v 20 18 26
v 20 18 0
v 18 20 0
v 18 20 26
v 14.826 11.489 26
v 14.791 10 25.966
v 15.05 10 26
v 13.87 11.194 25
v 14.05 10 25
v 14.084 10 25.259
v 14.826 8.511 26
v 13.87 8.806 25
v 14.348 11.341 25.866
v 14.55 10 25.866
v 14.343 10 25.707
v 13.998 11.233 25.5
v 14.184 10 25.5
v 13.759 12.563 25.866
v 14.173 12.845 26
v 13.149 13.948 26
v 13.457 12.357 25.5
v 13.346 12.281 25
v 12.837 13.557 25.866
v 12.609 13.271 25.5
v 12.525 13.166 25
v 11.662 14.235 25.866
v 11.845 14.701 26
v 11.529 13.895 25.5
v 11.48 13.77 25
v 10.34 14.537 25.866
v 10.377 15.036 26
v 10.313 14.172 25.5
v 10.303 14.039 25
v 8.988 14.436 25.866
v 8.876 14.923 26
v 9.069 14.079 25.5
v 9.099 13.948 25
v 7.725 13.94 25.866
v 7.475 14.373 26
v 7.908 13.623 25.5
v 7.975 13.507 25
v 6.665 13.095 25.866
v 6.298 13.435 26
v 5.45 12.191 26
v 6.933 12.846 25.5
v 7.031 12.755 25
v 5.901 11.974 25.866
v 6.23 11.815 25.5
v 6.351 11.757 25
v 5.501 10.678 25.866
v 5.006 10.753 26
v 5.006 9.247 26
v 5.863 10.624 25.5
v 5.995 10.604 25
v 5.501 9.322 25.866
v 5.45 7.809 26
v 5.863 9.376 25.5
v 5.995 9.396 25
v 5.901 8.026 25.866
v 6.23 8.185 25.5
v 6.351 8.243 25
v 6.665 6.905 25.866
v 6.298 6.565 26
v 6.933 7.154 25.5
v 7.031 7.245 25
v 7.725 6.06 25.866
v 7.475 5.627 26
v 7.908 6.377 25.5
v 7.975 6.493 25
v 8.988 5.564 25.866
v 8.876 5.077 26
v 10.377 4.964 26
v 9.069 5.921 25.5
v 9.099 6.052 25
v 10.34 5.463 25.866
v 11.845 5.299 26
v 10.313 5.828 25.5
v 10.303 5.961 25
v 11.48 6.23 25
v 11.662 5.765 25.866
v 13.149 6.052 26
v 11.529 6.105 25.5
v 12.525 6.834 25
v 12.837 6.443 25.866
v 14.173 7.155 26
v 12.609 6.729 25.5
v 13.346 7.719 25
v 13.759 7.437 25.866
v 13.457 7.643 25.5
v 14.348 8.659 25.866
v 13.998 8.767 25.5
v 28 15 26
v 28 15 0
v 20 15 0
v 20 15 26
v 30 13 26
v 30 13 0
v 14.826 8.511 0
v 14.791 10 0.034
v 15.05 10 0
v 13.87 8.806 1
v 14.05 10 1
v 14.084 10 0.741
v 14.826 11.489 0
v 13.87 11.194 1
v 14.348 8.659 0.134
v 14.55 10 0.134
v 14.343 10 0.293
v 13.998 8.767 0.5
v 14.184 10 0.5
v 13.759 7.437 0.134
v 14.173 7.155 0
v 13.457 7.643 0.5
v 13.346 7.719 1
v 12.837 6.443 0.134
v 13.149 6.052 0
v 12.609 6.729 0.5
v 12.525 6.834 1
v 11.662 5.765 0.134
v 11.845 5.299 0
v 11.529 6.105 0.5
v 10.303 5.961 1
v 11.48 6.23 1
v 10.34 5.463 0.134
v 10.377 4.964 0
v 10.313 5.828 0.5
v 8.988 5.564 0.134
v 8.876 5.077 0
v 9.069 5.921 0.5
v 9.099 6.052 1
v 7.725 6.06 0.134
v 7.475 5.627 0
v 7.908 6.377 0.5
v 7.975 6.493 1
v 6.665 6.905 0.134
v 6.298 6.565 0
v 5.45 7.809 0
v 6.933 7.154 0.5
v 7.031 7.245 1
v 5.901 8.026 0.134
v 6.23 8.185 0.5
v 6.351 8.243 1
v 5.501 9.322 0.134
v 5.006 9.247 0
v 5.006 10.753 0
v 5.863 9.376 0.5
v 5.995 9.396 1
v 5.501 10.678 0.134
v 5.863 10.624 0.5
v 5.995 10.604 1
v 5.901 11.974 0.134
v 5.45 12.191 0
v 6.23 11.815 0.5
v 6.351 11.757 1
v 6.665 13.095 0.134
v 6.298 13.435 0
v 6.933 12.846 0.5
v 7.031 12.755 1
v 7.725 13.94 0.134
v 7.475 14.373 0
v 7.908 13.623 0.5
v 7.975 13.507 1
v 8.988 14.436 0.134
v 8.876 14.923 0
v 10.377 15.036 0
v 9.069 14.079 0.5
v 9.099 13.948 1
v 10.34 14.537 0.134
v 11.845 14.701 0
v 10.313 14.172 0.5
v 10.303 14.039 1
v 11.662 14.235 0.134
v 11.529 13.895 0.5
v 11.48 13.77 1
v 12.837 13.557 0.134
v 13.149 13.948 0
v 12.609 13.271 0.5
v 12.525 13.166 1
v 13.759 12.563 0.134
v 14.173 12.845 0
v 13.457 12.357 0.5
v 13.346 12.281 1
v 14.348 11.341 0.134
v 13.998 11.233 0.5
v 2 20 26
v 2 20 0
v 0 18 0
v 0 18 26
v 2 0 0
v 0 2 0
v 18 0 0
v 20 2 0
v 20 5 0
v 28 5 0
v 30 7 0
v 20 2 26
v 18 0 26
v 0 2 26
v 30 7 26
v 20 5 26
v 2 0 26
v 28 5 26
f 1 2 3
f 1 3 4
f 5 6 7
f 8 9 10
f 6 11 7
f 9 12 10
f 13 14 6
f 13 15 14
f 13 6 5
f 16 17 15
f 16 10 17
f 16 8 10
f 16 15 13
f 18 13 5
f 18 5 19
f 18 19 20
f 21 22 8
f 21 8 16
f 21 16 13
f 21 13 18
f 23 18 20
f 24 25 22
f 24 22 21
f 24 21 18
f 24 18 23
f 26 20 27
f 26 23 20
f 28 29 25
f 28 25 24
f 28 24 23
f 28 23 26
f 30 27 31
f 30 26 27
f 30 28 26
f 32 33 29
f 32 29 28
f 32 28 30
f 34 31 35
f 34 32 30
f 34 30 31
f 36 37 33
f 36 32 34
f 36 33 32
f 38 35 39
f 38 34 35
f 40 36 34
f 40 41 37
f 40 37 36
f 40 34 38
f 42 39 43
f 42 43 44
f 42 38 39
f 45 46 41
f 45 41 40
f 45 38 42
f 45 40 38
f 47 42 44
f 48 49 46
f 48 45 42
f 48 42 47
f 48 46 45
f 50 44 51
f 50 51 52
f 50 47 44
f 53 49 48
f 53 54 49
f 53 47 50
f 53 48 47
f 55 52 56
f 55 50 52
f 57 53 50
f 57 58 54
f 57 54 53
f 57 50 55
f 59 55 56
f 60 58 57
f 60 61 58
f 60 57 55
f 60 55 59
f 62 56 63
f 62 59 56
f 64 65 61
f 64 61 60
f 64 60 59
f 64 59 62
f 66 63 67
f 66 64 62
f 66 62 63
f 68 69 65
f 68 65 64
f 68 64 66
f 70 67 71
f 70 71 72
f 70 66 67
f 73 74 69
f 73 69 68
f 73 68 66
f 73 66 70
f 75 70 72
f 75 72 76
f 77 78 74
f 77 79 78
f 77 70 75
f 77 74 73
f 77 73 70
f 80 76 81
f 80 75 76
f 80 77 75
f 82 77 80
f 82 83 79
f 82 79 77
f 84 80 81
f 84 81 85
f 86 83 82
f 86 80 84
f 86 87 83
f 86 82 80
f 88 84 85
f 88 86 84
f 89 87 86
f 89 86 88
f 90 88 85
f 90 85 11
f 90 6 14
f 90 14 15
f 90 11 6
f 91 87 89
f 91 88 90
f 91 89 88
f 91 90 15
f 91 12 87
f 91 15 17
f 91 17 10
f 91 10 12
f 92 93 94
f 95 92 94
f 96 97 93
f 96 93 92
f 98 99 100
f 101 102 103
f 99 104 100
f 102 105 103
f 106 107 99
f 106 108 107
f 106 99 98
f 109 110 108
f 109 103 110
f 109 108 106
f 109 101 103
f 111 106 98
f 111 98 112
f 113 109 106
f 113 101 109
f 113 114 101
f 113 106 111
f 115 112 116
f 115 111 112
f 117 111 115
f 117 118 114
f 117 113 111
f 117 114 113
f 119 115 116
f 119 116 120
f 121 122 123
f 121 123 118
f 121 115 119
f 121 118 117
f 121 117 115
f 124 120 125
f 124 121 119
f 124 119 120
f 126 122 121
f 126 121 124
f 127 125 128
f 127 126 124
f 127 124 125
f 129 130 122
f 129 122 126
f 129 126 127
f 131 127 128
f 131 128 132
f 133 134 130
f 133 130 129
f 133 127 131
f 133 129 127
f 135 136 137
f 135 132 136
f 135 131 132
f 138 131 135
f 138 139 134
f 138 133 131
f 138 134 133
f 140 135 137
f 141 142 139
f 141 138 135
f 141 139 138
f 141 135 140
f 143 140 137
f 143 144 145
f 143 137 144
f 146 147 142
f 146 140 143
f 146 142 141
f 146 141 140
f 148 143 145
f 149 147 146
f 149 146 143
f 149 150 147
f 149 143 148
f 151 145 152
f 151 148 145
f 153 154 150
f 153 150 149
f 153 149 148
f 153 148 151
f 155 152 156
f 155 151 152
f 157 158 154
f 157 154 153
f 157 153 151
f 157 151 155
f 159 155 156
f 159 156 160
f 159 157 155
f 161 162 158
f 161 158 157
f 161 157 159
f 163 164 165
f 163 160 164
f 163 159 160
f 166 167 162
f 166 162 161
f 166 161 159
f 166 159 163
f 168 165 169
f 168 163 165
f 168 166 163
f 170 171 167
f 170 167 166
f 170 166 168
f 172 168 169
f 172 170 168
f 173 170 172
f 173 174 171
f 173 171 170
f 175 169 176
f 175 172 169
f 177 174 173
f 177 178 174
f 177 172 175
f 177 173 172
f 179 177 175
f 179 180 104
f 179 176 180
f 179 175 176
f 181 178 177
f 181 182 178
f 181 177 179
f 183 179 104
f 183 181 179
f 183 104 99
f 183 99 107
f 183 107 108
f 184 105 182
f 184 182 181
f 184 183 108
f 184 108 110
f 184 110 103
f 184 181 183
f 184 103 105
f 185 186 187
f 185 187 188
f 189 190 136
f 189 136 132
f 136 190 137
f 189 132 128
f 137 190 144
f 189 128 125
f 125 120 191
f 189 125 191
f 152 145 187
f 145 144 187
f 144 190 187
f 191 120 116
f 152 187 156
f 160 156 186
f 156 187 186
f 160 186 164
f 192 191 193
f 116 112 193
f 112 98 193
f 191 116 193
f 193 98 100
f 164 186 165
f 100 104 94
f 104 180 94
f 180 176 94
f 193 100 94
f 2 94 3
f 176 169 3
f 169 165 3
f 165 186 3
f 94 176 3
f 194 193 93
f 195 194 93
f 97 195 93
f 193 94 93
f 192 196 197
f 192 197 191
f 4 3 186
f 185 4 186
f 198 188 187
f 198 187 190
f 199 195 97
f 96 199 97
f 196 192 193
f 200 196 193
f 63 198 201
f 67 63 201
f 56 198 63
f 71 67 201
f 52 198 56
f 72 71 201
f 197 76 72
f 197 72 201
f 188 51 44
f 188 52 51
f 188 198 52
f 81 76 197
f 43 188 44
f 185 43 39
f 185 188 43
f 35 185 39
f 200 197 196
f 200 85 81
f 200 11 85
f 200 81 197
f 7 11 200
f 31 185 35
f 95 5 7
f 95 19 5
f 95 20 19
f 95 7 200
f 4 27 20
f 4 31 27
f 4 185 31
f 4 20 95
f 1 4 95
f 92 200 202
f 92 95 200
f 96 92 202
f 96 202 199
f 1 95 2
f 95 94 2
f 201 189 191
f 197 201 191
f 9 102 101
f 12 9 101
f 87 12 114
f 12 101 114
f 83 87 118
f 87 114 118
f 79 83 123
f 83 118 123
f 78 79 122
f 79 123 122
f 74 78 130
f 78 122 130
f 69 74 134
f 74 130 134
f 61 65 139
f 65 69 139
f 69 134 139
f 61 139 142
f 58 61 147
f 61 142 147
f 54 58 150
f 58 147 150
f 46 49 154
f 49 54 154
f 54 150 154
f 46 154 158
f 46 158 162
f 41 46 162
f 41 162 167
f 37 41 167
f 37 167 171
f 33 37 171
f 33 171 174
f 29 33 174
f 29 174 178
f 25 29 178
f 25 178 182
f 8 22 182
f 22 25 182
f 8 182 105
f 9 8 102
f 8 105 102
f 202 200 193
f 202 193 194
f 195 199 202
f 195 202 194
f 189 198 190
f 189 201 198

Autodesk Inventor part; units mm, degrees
ref_plane "YZ Plane" through (0, 0, 0) normal (1, 0, 0) x (0, 1, 0)
ref_plane "XZ Plane" through (0, 0, 0) normal (0, 1, 0) x (-1, 0, 0)
ref_plane "XY Plane" through (0, 0, 0) normal (0, 0, 1) x (1, 0, 0)
sketch "Sketch1" plane through (0, 0, 0) normal (0, 0, 1) x (1, 0, 0)
  line L0 (0, 0) -> (20, 0)
  line L1 (20, 0) -> (20, 20)
  line L2 (20, 20) -> (0, 20)
  line L3 (0, 20) -> (0, 0)
  line L4 (-10, 5) -> (30, 5)
  line L5 (30, 5) -> (30, 15)
  line L6 (30, 15) -> (-10, 15)
  line L7 (-10, 15) -> (-10, 5)
  line L8 (-10, 5) -> (30, 15) construction
  line L9 (30, 5) -> (-10, 15) construction
  circle A0 centre (10, 10) radius 4.05
  point P0 (20, 5)
  point P1 (20, 15)
  dimension "d0" = 20
  dimension "d1" = 20
  dimension "d2" = 40
  dimension "d3" = 10
  dimension "d4" = 10
  dimension "d5" = 10
  dimension "d6" = 8.1
extrude "Extrusion1" add sketch "Sketch1" along normal blind 26 contours L3 L4 L1 L0 | L3 L6 L1 L4 | L1 L6 L5 L4 | L3 L2 L1 L6
chamfer "Chamfer1" distance 2 angle 45 6 edges at (20, 20, 13) (30, 15, 13) (30, 5, 13) (20, 0, 13) (0, 20, 13) (0, 0, 13)
fillet "Fillet1" radius 1 2 edges at (5.95, 10, 0) (5.95, 10, 26)
properties part number "Turret_Holder_2"
